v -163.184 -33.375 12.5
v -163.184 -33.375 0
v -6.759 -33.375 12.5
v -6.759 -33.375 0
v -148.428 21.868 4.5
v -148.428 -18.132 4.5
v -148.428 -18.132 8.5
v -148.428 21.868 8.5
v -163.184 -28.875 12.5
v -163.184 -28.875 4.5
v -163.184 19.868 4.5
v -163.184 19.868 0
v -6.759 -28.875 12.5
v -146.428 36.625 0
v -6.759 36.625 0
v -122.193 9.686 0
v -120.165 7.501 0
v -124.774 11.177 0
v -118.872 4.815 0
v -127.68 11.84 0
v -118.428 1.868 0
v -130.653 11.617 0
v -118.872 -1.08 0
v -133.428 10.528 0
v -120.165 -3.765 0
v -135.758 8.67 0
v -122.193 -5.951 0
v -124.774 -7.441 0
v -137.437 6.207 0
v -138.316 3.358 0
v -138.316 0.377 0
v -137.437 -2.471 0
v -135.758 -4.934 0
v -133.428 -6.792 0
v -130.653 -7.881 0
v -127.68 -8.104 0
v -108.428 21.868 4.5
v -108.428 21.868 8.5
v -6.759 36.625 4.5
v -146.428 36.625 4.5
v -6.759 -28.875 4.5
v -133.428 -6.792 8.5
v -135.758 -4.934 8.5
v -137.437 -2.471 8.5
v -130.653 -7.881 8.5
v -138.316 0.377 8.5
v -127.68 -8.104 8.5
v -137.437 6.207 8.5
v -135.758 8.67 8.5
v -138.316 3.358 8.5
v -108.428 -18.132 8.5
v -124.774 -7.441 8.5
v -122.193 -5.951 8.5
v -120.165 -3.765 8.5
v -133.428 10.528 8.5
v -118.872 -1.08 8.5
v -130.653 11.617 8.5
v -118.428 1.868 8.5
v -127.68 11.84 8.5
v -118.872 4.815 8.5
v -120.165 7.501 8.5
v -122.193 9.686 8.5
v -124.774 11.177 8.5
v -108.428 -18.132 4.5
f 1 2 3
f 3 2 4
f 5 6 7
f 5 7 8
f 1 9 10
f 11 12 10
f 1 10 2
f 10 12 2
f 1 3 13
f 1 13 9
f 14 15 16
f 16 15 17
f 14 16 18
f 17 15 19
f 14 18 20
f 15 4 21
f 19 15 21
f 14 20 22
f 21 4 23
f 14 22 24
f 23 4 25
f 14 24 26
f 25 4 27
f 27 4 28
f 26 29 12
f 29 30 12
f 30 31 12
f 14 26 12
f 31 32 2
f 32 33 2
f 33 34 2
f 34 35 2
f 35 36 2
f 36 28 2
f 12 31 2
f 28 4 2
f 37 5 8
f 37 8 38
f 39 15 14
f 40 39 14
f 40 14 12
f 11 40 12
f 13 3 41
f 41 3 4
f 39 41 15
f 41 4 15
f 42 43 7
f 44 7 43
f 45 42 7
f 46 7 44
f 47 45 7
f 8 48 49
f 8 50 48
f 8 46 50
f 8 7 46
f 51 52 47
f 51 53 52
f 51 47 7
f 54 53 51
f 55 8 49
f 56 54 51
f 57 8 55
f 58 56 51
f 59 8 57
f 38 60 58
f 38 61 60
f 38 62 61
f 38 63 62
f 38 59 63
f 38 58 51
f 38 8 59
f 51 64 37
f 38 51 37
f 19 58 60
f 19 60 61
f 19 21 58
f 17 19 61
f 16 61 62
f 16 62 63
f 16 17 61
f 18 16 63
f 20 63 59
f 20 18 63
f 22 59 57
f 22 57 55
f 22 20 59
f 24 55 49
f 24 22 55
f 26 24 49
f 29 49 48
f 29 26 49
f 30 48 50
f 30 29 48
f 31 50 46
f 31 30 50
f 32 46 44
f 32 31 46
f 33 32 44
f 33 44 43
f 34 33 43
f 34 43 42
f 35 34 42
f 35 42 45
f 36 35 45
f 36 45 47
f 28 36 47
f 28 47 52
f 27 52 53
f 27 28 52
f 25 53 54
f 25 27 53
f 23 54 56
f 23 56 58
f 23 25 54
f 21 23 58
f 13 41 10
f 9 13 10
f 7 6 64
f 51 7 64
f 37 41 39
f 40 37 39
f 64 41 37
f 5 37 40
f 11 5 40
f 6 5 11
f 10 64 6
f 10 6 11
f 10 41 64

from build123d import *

# Parameters (mm, degrees)
SKETCH2_R           = 10
BOSS_EXTRUDE2_DEPTH = 4.5
SKETCH2_5_W         = 90
SKETCH2_5_H         = 65.5
BOSS_EXTRUDE4_DEPTH = 4.5
BOSS_EXTRUDE5_DEPTH = 12.5
SKETCH4_W           = 40
SKETCH4_H           = 40
SKETCH4_R           = 10
BOSS_EXTRUDE6_DEPTH = 4


with BuildPart() as part:
    # Sketch2 → Boss-Extrude2 (new body)
    with BuildSketch(Plane(origin=(0, 0, 0), x_dir=(-1, 0, 0), z_dir=(0, 0, 1))):
        Polygon((96.758646955, 28.875433948), (96.758646955, -36.624566052), (146.427679381, -36.624566052), (163.18445937, -19.867786064), (163.18445937, 28.875433948), align=None)
        with Locations((128.427679381, -1.867786064)):
            Circle(SKETCH2_R, mode=Mode.SUBTRACT)
    extrude(amount=BOSS_EXTRUDE2_DEPTH)

    # Sketch2<5> → Boss-Extrude4 (add)
    with BuildSketch(Plane(origin=(0, 0, 0), x_dir=(-1, 0, 0), z_dir=(0, 0, 1))):
        with Locations((51.758646955, -3.874566052)):
            Rectangle(SKETCH2_5_W, SKETCH2_5_H)
    extrude(amount=BOSS_EXTRUDE4_DEPTH)

    # Sketch2<7> → Boss-Extrude5 (add)
    with BuildSketch(Plane(origin=(0, 0, 0), x_dir=(-1, 0, 0), z_dir=(0, 0, 1))):
        Polygon((6.758646955, 33.375433948), (6.758646955, 28.875433948), (96.758646955, 28.875433948), (163.18445937, 28.875433948), (163.18445937, 33.375433948), align=None)
    extrude(amount=BOSS_EXTRUDE5_DEPTH)

    # Sketch4 → Boss-Extrude6 (add)
    with BuildSketch(Plane.XY.offset(4.5)):
        with Locations((-128.427679381, 1.867786064)):
            Rectangle(SKETCH4_W, SKETCH4_H)
        with Locations((-128.427679381, 1.867786064)):
            Circle(SKETCH4_R, mode=Mode.SUBTRACT)
    extrude(amount=BOSS_EXTRUDE6_DEPTH)


solid = part.part
